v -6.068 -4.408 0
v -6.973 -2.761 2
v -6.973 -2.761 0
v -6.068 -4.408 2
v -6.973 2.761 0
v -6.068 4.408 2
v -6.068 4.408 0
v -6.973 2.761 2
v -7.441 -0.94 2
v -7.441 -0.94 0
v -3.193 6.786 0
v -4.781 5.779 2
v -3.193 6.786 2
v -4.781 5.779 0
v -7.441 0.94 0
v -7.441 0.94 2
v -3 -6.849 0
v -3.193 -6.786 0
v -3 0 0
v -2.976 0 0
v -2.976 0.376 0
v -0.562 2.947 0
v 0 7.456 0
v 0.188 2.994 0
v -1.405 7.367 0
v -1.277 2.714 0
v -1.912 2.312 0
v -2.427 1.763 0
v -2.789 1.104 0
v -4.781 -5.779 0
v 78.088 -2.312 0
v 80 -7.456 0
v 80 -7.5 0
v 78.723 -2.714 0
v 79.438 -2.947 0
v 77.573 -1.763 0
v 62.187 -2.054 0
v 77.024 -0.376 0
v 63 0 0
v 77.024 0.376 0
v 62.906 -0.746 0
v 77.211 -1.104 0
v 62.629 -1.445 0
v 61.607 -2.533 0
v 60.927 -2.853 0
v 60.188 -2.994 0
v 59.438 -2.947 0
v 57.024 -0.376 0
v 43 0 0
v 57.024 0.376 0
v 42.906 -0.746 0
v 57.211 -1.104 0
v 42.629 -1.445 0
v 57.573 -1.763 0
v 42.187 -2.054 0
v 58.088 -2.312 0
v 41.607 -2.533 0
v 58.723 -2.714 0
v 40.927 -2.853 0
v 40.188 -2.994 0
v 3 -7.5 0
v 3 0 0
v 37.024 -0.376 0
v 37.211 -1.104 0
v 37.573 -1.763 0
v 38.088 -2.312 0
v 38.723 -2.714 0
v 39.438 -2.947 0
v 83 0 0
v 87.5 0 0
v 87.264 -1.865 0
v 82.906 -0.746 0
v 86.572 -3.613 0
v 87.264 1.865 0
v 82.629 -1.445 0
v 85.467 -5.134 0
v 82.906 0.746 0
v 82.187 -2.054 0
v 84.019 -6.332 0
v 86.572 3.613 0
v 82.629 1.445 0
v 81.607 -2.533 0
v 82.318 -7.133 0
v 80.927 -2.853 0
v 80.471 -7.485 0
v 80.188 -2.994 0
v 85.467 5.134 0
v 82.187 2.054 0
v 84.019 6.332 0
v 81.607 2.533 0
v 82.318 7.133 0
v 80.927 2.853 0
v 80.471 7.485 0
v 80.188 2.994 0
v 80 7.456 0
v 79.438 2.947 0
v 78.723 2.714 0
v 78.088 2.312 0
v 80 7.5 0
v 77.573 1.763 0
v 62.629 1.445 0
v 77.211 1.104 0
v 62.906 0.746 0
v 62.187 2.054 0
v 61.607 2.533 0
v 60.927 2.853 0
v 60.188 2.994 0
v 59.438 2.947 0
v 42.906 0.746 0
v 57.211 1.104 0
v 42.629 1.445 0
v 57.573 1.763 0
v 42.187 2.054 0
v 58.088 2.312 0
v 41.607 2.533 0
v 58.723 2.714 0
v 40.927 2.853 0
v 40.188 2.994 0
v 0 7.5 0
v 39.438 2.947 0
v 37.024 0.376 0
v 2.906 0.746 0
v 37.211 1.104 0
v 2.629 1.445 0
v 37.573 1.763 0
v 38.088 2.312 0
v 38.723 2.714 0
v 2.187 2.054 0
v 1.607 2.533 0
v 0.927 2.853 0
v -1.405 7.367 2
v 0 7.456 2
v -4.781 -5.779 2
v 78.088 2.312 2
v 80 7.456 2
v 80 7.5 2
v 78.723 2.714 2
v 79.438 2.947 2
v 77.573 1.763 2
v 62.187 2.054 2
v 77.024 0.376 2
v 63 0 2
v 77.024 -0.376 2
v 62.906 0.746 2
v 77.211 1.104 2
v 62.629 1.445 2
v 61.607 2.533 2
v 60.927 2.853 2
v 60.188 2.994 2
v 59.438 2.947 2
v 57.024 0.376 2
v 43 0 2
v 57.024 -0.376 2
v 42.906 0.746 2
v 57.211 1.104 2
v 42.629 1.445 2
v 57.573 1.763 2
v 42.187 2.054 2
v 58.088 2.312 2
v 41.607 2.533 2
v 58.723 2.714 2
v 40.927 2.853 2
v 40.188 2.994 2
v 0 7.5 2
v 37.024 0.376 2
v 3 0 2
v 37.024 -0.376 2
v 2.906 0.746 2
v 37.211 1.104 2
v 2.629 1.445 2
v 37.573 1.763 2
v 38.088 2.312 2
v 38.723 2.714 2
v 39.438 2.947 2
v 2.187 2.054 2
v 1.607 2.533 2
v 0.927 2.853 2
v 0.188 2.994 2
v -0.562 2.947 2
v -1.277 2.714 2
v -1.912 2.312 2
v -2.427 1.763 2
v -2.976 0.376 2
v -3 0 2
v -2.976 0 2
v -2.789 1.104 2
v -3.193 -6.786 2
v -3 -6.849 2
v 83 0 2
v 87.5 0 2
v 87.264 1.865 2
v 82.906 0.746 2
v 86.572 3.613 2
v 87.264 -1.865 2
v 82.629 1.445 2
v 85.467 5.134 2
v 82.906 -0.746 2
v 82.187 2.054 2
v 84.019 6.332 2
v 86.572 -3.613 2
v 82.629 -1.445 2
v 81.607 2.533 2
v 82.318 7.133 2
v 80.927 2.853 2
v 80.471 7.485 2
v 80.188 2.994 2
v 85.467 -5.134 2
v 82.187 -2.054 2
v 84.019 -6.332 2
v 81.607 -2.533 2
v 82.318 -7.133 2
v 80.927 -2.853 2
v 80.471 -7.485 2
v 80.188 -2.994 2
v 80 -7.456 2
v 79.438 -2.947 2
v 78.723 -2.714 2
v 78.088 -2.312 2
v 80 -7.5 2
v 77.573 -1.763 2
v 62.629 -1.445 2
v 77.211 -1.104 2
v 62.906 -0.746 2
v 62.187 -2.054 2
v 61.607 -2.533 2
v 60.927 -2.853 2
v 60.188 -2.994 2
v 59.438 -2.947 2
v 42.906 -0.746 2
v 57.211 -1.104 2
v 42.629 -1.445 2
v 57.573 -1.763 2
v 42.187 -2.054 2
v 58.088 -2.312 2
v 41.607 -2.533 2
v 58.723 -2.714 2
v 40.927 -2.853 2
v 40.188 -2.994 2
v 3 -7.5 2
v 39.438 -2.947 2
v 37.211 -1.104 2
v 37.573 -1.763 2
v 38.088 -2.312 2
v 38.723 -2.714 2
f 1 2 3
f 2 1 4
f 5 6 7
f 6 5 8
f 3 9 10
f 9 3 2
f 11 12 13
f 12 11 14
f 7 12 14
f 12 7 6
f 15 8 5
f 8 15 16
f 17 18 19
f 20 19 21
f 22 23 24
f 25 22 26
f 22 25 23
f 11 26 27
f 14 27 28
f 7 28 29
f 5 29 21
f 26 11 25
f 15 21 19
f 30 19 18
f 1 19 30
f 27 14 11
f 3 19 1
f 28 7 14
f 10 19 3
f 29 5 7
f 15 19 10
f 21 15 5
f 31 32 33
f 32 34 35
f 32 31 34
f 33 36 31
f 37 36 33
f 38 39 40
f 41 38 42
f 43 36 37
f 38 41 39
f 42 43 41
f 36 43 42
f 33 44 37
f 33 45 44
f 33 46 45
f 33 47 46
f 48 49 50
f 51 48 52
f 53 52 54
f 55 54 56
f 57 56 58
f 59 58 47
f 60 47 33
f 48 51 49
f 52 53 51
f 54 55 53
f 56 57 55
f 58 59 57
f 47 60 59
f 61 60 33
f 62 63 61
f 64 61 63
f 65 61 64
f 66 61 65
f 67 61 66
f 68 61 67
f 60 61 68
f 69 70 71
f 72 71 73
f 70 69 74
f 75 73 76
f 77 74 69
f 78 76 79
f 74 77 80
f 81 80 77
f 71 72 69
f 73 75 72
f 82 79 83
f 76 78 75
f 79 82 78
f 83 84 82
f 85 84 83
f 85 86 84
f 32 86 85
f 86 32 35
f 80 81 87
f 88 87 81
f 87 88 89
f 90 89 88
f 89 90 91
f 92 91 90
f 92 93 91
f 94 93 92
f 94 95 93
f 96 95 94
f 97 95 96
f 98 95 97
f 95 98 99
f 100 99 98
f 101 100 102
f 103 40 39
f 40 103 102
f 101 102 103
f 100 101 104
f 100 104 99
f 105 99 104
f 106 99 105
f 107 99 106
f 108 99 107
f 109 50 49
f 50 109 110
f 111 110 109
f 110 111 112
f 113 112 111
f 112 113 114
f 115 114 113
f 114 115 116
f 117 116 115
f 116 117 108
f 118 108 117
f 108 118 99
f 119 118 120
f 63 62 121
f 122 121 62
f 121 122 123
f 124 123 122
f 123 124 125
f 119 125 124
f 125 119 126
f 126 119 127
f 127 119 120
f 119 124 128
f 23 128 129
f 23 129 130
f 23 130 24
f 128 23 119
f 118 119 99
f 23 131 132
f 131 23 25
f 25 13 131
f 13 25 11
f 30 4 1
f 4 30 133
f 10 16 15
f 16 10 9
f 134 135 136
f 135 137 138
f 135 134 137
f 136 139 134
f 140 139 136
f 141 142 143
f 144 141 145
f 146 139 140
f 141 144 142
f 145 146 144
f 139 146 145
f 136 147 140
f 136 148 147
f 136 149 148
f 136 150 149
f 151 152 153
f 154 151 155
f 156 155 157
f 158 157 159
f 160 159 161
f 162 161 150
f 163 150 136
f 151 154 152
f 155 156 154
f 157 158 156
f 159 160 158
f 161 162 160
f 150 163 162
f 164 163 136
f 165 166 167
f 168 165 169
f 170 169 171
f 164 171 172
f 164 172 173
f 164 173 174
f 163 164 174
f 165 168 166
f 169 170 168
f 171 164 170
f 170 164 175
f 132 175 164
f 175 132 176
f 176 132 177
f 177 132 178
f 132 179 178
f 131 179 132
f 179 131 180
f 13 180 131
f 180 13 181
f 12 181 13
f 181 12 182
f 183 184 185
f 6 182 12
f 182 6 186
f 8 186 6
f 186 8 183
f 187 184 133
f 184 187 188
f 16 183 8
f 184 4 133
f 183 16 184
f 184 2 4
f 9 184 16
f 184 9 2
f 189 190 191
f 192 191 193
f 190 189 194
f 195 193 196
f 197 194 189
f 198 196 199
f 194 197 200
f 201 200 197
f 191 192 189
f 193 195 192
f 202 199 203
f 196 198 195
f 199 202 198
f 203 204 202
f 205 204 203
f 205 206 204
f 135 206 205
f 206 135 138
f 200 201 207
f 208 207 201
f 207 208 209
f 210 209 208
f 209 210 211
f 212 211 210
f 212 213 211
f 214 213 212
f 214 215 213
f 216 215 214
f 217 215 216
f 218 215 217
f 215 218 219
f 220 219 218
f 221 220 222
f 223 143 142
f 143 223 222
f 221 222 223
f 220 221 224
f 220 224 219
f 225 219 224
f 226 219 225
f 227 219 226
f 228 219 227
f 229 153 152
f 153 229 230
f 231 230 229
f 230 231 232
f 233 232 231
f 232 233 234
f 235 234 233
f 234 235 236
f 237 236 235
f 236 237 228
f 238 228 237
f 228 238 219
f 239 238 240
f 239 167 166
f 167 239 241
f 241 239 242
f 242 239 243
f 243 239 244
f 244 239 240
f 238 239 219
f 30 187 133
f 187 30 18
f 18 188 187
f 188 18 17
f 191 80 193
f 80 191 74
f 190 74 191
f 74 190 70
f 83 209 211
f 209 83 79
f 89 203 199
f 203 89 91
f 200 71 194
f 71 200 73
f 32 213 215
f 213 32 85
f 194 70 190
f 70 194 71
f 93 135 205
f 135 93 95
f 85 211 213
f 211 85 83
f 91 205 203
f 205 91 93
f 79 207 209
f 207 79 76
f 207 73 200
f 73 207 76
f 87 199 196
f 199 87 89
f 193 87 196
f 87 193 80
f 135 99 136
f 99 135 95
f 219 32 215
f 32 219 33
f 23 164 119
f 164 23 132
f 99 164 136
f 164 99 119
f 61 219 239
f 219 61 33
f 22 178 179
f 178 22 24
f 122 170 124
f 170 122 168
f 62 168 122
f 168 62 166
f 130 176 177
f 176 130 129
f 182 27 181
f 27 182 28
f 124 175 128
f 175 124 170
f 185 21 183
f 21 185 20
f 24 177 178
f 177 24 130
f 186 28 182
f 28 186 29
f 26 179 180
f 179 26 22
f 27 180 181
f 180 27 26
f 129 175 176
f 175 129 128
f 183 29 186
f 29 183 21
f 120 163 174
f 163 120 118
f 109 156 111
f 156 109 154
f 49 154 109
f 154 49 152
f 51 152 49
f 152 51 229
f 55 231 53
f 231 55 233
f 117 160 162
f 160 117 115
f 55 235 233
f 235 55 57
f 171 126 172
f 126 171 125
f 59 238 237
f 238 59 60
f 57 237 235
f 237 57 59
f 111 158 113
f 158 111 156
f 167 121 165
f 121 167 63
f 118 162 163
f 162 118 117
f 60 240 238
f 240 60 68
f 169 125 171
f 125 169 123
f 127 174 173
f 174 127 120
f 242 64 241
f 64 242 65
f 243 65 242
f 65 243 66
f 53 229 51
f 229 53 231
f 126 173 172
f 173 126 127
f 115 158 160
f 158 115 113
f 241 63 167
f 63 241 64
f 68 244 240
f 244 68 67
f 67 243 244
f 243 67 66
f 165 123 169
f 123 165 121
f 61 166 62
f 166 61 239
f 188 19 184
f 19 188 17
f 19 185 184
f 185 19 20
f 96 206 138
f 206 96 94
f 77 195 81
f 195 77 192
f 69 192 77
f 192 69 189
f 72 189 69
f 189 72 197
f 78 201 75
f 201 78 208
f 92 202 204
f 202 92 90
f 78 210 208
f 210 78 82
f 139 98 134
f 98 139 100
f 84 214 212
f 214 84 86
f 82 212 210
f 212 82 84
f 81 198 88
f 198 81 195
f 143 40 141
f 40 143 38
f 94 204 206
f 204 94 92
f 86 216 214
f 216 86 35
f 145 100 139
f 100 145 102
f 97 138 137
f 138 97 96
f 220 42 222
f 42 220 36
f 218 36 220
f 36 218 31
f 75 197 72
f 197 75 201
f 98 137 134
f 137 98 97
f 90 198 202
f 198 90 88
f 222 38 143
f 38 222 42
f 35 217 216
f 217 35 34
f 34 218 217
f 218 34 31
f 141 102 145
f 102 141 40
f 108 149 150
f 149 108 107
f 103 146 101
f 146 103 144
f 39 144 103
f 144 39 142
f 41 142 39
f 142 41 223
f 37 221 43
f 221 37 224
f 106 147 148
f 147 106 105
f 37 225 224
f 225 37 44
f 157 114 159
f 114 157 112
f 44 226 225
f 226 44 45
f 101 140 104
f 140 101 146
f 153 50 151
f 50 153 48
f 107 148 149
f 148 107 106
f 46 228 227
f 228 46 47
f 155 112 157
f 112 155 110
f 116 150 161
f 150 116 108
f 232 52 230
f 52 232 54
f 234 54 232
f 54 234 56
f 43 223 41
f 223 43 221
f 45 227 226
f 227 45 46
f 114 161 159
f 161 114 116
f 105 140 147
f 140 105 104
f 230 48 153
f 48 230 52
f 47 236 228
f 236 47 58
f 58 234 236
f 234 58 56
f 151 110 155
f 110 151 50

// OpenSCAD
quality=25;


bar_length=80;
bar_thickness=2;

pin_radius=2.5;
gap_radius=3;
pin_length=12;

//bar backing

difference() 
{
    union()
    {
        //backing
        cylinder(r=pin_radius*3,h=bar_thickness,$fn=quality);
        translate([bar_length,0,0]) cylinder(r=pin_radius*3,h=bar_thickness,$fn=quality);
        translate([0,-pin_radius*3,0]) cube([bar_length,pin_radius*6,bar_thickness]);
}


//socket generation
union()
{
    cylinder(r=gap_radius,h=bar_thickness,$fn=quality);
    translate([bar_length/2,0,0]) cylinder(r=gap_radius,h=bar_thickness,$fn=quality);
    translate([-gap_radius,-pin_radius*3,0]) cube([gap_radius*2,pin_radius*3,bar_thickness]);
    //translate([-gap_radius + bar_length/2,0,0]) cube([gap_radius*2,pin_radius*3,bar_thickness]);
    
    translate([bar_length,0,0]) cylinder(r=gap_radius,h=pin_length,$fn=quality); 
    translate([(bar_length/4)*3,0,0]) cylinder(r=gap_radius,h=pin_length,$fn=quality);
}

}
